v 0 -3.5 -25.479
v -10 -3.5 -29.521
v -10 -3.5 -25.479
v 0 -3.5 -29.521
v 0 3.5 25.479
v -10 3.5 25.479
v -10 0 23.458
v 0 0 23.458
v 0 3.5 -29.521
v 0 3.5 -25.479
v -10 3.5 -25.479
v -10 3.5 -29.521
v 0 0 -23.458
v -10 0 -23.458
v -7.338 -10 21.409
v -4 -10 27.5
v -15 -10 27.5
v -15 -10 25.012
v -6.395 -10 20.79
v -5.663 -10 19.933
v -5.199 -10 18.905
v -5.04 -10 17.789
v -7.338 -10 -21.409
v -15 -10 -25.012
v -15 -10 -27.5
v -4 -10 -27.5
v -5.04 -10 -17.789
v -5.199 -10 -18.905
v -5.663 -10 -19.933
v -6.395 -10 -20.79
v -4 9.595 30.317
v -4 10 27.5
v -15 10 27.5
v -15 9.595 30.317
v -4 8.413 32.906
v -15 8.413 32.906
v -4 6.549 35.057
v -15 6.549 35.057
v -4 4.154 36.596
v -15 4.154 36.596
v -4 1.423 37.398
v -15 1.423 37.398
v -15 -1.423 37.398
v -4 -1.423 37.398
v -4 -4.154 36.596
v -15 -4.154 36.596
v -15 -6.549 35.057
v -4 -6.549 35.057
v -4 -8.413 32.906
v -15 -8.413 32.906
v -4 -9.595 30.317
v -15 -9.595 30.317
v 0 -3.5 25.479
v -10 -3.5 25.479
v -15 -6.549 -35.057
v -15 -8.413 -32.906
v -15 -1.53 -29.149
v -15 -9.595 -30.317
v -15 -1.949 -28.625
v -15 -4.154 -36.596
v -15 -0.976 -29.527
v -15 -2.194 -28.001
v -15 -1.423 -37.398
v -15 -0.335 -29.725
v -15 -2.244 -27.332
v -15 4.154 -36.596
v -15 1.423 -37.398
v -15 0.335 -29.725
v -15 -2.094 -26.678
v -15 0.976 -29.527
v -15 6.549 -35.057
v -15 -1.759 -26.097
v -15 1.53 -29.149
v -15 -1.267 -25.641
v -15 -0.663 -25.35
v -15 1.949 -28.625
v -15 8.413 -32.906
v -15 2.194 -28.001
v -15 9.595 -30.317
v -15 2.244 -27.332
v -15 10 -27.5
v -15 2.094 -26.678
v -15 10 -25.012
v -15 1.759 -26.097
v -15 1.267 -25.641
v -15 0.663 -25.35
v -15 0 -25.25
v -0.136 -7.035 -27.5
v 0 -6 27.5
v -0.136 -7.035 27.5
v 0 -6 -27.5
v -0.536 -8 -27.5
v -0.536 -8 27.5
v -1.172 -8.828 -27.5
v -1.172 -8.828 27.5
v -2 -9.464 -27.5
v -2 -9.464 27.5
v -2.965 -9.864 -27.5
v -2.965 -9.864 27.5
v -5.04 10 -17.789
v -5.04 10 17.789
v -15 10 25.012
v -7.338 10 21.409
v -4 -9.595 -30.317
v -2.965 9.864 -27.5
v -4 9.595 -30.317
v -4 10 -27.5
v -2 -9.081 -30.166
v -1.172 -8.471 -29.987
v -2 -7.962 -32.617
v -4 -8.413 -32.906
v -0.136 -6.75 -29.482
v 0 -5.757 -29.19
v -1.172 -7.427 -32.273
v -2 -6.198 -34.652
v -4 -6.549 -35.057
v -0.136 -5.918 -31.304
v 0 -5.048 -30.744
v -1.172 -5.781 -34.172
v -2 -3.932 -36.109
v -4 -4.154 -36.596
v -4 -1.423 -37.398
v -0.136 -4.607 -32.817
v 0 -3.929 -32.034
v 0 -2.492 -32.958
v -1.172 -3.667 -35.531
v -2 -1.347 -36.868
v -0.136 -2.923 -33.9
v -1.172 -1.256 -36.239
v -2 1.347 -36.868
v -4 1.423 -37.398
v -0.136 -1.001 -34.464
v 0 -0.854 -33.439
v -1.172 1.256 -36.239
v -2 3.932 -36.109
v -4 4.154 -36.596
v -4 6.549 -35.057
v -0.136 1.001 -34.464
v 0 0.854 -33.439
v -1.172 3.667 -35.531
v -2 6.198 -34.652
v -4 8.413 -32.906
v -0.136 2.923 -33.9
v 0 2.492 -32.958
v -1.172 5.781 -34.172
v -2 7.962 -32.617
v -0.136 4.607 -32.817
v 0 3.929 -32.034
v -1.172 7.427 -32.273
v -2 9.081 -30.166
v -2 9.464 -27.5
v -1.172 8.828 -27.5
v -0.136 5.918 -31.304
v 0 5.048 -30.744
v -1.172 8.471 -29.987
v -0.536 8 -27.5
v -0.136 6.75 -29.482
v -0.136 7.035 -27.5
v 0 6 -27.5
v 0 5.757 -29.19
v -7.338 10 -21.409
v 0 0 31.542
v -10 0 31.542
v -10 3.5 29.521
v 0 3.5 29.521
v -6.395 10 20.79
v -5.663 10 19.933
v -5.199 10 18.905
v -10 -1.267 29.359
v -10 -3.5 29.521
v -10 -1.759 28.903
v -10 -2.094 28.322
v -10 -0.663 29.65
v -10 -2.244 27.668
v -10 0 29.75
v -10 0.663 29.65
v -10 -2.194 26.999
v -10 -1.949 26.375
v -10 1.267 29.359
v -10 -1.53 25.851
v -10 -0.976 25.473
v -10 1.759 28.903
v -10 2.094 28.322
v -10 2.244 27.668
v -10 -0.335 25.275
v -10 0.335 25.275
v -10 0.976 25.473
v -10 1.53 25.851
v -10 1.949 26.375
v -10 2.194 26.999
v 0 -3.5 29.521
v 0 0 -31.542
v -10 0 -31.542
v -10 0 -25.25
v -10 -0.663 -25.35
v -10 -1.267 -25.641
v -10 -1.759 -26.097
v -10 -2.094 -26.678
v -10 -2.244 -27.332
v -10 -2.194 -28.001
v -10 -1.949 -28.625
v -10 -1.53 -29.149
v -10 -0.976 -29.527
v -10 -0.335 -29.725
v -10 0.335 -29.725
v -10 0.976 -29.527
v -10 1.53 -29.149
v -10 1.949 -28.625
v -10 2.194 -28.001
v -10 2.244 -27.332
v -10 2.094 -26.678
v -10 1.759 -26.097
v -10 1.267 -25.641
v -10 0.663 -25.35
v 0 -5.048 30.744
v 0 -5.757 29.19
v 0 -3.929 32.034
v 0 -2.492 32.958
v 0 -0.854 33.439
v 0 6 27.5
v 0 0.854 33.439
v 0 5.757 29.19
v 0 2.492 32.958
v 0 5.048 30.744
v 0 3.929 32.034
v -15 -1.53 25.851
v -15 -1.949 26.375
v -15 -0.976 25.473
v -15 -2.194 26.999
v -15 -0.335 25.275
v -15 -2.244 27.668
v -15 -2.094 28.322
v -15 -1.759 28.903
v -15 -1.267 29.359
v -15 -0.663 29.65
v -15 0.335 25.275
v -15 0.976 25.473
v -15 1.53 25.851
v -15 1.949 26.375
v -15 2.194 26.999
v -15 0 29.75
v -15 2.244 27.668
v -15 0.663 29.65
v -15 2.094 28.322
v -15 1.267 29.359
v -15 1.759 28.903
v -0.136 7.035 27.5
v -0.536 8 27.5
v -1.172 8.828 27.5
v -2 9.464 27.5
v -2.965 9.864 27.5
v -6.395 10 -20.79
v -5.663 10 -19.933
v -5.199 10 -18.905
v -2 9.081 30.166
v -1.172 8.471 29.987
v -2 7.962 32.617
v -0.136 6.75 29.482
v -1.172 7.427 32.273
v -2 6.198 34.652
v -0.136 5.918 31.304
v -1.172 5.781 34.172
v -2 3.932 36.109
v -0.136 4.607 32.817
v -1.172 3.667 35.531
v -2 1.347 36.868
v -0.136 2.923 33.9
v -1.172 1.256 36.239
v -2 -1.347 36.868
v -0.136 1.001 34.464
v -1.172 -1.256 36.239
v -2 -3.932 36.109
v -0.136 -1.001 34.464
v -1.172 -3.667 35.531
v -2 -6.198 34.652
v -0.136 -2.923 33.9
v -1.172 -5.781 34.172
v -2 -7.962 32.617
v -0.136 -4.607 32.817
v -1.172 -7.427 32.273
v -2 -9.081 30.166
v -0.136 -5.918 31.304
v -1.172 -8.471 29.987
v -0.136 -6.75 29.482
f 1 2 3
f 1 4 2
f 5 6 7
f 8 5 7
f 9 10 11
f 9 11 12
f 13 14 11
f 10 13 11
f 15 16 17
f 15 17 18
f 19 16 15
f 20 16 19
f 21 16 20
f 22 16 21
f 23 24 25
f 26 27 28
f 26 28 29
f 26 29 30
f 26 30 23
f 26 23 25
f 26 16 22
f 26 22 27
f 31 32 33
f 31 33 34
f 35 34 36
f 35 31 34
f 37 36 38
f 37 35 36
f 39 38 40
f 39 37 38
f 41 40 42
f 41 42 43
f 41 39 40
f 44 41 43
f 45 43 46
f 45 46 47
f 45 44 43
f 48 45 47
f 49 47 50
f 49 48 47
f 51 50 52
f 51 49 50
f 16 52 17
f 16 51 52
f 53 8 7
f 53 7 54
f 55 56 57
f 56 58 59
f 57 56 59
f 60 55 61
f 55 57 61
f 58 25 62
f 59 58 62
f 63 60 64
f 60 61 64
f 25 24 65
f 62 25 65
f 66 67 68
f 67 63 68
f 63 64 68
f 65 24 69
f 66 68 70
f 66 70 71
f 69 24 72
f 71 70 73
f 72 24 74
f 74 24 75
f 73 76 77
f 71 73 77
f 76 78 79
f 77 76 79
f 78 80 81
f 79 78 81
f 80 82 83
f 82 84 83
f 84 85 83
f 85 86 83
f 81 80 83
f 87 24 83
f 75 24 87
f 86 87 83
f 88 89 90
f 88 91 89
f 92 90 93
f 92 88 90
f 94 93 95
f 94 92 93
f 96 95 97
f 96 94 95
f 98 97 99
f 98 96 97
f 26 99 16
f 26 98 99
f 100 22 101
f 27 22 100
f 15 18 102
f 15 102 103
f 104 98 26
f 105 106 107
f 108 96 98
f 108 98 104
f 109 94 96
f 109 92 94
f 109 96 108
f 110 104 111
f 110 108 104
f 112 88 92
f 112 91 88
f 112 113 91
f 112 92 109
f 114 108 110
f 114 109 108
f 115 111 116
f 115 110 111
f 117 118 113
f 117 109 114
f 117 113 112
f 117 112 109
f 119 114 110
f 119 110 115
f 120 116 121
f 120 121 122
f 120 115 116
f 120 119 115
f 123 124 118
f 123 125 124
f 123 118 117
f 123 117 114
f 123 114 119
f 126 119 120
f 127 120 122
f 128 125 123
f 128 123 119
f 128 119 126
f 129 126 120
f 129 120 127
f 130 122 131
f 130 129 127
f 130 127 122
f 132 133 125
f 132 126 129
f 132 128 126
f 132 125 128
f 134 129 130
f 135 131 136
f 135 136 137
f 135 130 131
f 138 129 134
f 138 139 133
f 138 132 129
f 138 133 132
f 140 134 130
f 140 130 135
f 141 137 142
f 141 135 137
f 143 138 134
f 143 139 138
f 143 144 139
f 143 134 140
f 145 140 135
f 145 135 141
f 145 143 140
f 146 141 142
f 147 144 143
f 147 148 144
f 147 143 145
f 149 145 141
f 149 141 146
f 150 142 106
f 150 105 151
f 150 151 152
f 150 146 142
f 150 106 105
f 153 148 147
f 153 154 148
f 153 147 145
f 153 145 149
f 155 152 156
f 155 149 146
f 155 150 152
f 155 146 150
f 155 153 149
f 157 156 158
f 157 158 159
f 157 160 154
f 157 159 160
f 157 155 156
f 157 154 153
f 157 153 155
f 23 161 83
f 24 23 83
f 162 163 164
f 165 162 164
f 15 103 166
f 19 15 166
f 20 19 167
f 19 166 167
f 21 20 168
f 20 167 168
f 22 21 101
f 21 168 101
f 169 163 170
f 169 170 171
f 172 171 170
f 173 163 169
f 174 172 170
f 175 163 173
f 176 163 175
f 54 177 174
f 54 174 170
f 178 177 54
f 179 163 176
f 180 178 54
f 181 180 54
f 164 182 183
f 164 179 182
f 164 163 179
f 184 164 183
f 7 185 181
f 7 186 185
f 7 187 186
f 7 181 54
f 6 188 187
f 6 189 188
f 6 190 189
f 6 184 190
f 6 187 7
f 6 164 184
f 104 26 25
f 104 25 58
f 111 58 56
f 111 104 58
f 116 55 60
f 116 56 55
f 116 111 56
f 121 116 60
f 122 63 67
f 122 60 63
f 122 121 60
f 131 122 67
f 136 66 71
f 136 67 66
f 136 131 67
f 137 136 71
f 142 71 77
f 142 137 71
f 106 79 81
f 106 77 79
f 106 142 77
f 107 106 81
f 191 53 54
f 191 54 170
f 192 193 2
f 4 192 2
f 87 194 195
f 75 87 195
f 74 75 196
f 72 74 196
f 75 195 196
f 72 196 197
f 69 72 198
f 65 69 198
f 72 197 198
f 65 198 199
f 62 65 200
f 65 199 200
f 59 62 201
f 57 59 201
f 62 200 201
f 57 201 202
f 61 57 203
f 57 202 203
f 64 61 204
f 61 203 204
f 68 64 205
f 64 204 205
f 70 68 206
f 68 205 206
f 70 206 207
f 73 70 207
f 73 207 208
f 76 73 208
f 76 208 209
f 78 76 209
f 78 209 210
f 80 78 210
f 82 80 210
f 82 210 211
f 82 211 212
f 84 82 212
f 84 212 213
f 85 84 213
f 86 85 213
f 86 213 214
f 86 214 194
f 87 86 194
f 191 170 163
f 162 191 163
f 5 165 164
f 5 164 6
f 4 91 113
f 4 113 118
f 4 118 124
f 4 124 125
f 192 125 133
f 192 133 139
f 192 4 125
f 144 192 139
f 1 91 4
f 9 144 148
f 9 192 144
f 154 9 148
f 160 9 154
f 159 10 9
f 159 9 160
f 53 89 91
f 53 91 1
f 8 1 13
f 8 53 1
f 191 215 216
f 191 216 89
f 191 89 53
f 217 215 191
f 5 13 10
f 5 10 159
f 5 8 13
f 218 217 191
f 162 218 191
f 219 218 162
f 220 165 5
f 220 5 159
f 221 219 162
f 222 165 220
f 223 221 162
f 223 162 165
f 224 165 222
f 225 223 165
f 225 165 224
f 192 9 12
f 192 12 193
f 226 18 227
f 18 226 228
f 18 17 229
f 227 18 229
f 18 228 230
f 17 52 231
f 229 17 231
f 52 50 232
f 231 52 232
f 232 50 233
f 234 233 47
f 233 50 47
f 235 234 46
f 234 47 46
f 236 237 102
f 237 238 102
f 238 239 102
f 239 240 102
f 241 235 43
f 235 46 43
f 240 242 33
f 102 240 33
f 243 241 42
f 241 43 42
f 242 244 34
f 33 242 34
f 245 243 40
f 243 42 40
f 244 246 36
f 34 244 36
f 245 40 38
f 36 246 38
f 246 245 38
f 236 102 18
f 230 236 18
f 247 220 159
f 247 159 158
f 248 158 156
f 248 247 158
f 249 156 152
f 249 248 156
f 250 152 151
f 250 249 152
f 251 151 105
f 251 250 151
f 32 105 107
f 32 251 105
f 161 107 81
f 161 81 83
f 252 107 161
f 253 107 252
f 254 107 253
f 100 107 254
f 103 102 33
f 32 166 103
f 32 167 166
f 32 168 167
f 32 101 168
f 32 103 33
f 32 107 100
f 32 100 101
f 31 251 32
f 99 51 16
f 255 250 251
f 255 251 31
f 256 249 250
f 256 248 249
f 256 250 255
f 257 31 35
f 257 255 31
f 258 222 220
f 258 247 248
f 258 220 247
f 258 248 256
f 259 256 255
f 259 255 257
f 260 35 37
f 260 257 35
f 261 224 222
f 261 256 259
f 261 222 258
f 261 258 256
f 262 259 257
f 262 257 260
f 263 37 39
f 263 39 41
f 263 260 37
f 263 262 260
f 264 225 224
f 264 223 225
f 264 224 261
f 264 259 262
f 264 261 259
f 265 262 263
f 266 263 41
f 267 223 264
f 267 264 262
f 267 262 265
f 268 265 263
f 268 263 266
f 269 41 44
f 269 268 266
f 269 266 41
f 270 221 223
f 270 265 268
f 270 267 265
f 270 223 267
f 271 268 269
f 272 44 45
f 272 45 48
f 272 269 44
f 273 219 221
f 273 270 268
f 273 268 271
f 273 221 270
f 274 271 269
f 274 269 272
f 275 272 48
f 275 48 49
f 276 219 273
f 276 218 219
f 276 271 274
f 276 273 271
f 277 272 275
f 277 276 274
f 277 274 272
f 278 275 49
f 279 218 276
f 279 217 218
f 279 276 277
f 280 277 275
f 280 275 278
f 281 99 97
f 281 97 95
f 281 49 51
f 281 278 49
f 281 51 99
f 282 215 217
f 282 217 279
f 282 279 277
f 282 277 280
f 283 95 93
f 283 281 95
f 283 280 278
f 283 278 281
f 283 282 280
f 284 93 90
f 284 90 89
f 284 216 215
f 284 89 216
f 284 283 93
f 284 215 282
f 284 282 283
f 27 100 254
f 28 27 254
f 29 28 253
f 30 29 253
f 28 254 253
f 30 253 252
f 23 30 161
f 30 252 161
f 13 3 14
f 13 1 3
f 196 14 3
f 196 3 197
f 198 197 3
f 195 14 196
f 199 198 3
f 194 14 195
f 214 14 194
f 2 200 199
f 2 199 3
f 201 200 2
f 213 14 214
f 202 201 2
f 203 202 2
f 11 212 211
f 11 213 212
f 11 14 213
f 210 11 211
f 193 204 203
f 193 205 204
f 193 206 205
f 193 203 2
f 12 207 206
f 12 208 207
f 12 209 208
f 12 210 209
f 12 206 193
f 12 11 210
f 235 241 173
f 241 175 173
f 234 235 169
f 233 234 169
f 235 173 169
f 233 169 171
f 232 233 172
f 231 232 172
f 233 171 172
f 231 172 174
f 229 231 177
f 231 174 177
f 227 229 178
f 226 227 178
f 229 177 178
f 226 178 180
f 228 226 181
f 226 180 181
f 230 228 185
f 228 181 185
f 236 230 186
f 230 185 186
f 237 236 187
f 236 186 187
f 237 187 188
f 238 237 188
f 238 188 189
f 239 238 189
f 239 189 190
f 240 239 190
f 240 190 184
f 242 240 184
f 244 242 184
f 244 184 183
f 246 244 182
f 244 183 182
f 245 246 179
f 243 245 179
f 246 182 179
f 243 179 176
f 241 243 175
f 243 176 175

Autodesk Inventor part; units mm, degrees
ref_plane "YZ Plane" through (0, 0, 0) normal (1, 0, 0) x (0, 1, 0)
ref_plane "XZ Plane" through (0, 0, 0) normal (0, 1, 0) x (-1, 0, 0)
ref_plane "XY Plane" through (0, 0, 0) normal (0, 0, 1) x (1, 0, 0)
sketch "Sketch1" plane through (0, 0, 0) normal (1, 0, 0) x (0, 1, 0)
  line L0 (10, 37.5) -> (-10, 37.5)
  line L1 (-10, 37.5) -> (-10, -37.5)
  line L2 (-10, -37.5) -> (10, -37.5)
  line L3 (10, -37.5) -> (10, 37.5)
  line L4 (10, 37.5) -> (-10, -37.5) construction
  line L5 (-10, 37.5) -> (10, -37.5) construction
  circle A0 centre (0, 27.5) radius 10
  circle A1 centre (0, -27.5) radius 10
  point P0 (0, 0)
  point P1 (10, -27.5)
  point P2 (10, 27.5)
  point P3 (-10, 27.5)
  point P4 (-10, -27.5)
  dimension "d0" = 20
  dimension "d1" = 75
  dimension "d2" = 20
  dimension "d3" = 20
  dimension "d4" = 55
extrude "Extrusion1" add sketch "Sketch1" against normal blind 15 contours A0 | L3 A1 L1 A0 | A1
sketch "Sketch2" plane through (0, -10, -27.5) normal (0, -1, 0) x (1, 0, 0)
  line L0 (-15, 55) -> (-15, 0) projected
  line L1 (-15, 52.5125) -> (-5.0401, 47.8284)
  line L2 (-5.0401, 47.8284) -> (-5.0401, 7.1716)
  line L3 (-5.0401, 7.1716) -> (-15, 2.4875)
  line L4 (-15, 0) -> (-15, -10) projected
  line L5 (0, 55) -> (0, 65) construction
  line L6 (0, 65) -> (-5.0401, 47.8284) construction
  line L7 (0, -10) -> (0, 0) construction
  line L8 (-5.0401, 7.1716) -> (0, -10) construction
  point P0 (0, 27.5)
  point P1 (-15, 2.4875)
extrude "Extrusion2" cut sketch "Sketch2" against normal blind 20
fillet "Fillet1" radius 4 6 edges at (0, -10, 0) (0, 0, -37.5) (0, 10, 0) (0, 0, 37.5) (-5.0401, 0, -20.3284) (-5.0401, 0, 20.3284)
sketch "Sketch3" plane through (0, 0, 0) normal (1, 0, 0) x (0, 0, -1)
  line L0 (25.0125, -10) -> (25.0125, 10) projected
  line L1 (25.0125, 10) -> (27.5, 10) projected
  arc A0 (27.5, -10) -> (27.5, 10) centre (27.5, 0) ccw projected
  line L2 (27.5, -10) -> (25.0125, -10) projected
  arc A1 (-27.5, 6) -> (-27.5, -6) centre (-27.5, 0) ccw projected
  line L3 (-23.4585, 0) -> (-25.4793, -3.5)
  line L4 (-25.4793, -3.5) -> (-29.5207, -3.5)
  line L5 (-29.5207, -3.5) -> (-31.5415, 0)
  line L6 (-31.5415, 0) -> (-29.5207, 3.5)
  line L7 (-29.5207, 3.5) -> (-25.4793, 3.5)
  line L8 (-25.4793, 3.5) -> (-23.4585, 0)
  line L9 (23.4585, 0) -> (25.4793, 3.5)
  line L10 (25.4793, 3.5) -> (29.5207, 3.5)
  line L11 (29.5207, 3.5) -> (31.5415, 0)
  line L12 (31.5415, 0) -> (29.5207, -3.5)
  line L13 (29.5207, -3.5) -> (25.4793, -3.5)
  line L14 (25.4793, -3.5) -> (23.4585, 0)
  point P0 (0, 0)
  dimension "d10" = 7
  dimension "d11" = 7
extrude "Extrusion3" cut sketch "Sketch3" against normal blind 10 contours L14 L9 L0 | L0 L9 L10 L11 L12 L13 L14 | L3 L4 L5 L6 L7 L8
sketch "Sketch4" plane through (-15, 0, 0) normal (-1, 0, 0) x (0, 0, 1)
  line L0 (-21.409, 10) -> (-21.409, -10) projected
  line L1 (-29.5207, 3.5) -> (-31.5415, 0) projected
  line L2 (-31.5415, 0) -> (-29.5207, -3.5) projected
  line L3 (-29.5207, -3.5) -> (-25.4793, -3.5) projected
  line L4 (-25.4793, -3.5) -> (-23.4585, 0) projected
  line L5 (-23.4585, 0) -> (-25.4793, 3.5) projected
  line L6 (-25.4793, 3.5) -> (-29.5207, 3.5) projected
  line L7 (29.5207, 3.5) -> (25.4793, 3.5) projected
  line L8 (25.4793, 3.5) -> (23.4585, 0) projected
  line L9 (23.4585, 0) -> (25.4793, -3.5) projected
  line L10 (25.4793, -3.5) -> (29.5207, -3.5) projected
  line L11 (29.5207, -3.5) -> (31.5415, 0) projected
  line L12 (31.5415, 0) -> (29.5207, 3.5) projected
  line L13 (-27.5, -6) -> (27.5, -6) projected
  arc A0 (-27.5, 6) -> (-27.5, -6) centre (-27.5, 0) ccw projected
  line L14 (27.5, 6) -> (-27.5, 6) projected
  arc A1 (27.5, -6) -> (27.5, 6) centre (27.5, 0) ccw projected
  point P0 (0, 0)
hole "Hole1" at (-15, 0, -27.5) at (-15, 0, 27.5) direction (1, 0, 0) diameter 4.5 end through all clearance for "Countersunk Flat Head Screw ISO 2009/7046" size "M4" standard "ISO"
equation "\"d11\" = d10"
properties part number "controlbox_handvat"
